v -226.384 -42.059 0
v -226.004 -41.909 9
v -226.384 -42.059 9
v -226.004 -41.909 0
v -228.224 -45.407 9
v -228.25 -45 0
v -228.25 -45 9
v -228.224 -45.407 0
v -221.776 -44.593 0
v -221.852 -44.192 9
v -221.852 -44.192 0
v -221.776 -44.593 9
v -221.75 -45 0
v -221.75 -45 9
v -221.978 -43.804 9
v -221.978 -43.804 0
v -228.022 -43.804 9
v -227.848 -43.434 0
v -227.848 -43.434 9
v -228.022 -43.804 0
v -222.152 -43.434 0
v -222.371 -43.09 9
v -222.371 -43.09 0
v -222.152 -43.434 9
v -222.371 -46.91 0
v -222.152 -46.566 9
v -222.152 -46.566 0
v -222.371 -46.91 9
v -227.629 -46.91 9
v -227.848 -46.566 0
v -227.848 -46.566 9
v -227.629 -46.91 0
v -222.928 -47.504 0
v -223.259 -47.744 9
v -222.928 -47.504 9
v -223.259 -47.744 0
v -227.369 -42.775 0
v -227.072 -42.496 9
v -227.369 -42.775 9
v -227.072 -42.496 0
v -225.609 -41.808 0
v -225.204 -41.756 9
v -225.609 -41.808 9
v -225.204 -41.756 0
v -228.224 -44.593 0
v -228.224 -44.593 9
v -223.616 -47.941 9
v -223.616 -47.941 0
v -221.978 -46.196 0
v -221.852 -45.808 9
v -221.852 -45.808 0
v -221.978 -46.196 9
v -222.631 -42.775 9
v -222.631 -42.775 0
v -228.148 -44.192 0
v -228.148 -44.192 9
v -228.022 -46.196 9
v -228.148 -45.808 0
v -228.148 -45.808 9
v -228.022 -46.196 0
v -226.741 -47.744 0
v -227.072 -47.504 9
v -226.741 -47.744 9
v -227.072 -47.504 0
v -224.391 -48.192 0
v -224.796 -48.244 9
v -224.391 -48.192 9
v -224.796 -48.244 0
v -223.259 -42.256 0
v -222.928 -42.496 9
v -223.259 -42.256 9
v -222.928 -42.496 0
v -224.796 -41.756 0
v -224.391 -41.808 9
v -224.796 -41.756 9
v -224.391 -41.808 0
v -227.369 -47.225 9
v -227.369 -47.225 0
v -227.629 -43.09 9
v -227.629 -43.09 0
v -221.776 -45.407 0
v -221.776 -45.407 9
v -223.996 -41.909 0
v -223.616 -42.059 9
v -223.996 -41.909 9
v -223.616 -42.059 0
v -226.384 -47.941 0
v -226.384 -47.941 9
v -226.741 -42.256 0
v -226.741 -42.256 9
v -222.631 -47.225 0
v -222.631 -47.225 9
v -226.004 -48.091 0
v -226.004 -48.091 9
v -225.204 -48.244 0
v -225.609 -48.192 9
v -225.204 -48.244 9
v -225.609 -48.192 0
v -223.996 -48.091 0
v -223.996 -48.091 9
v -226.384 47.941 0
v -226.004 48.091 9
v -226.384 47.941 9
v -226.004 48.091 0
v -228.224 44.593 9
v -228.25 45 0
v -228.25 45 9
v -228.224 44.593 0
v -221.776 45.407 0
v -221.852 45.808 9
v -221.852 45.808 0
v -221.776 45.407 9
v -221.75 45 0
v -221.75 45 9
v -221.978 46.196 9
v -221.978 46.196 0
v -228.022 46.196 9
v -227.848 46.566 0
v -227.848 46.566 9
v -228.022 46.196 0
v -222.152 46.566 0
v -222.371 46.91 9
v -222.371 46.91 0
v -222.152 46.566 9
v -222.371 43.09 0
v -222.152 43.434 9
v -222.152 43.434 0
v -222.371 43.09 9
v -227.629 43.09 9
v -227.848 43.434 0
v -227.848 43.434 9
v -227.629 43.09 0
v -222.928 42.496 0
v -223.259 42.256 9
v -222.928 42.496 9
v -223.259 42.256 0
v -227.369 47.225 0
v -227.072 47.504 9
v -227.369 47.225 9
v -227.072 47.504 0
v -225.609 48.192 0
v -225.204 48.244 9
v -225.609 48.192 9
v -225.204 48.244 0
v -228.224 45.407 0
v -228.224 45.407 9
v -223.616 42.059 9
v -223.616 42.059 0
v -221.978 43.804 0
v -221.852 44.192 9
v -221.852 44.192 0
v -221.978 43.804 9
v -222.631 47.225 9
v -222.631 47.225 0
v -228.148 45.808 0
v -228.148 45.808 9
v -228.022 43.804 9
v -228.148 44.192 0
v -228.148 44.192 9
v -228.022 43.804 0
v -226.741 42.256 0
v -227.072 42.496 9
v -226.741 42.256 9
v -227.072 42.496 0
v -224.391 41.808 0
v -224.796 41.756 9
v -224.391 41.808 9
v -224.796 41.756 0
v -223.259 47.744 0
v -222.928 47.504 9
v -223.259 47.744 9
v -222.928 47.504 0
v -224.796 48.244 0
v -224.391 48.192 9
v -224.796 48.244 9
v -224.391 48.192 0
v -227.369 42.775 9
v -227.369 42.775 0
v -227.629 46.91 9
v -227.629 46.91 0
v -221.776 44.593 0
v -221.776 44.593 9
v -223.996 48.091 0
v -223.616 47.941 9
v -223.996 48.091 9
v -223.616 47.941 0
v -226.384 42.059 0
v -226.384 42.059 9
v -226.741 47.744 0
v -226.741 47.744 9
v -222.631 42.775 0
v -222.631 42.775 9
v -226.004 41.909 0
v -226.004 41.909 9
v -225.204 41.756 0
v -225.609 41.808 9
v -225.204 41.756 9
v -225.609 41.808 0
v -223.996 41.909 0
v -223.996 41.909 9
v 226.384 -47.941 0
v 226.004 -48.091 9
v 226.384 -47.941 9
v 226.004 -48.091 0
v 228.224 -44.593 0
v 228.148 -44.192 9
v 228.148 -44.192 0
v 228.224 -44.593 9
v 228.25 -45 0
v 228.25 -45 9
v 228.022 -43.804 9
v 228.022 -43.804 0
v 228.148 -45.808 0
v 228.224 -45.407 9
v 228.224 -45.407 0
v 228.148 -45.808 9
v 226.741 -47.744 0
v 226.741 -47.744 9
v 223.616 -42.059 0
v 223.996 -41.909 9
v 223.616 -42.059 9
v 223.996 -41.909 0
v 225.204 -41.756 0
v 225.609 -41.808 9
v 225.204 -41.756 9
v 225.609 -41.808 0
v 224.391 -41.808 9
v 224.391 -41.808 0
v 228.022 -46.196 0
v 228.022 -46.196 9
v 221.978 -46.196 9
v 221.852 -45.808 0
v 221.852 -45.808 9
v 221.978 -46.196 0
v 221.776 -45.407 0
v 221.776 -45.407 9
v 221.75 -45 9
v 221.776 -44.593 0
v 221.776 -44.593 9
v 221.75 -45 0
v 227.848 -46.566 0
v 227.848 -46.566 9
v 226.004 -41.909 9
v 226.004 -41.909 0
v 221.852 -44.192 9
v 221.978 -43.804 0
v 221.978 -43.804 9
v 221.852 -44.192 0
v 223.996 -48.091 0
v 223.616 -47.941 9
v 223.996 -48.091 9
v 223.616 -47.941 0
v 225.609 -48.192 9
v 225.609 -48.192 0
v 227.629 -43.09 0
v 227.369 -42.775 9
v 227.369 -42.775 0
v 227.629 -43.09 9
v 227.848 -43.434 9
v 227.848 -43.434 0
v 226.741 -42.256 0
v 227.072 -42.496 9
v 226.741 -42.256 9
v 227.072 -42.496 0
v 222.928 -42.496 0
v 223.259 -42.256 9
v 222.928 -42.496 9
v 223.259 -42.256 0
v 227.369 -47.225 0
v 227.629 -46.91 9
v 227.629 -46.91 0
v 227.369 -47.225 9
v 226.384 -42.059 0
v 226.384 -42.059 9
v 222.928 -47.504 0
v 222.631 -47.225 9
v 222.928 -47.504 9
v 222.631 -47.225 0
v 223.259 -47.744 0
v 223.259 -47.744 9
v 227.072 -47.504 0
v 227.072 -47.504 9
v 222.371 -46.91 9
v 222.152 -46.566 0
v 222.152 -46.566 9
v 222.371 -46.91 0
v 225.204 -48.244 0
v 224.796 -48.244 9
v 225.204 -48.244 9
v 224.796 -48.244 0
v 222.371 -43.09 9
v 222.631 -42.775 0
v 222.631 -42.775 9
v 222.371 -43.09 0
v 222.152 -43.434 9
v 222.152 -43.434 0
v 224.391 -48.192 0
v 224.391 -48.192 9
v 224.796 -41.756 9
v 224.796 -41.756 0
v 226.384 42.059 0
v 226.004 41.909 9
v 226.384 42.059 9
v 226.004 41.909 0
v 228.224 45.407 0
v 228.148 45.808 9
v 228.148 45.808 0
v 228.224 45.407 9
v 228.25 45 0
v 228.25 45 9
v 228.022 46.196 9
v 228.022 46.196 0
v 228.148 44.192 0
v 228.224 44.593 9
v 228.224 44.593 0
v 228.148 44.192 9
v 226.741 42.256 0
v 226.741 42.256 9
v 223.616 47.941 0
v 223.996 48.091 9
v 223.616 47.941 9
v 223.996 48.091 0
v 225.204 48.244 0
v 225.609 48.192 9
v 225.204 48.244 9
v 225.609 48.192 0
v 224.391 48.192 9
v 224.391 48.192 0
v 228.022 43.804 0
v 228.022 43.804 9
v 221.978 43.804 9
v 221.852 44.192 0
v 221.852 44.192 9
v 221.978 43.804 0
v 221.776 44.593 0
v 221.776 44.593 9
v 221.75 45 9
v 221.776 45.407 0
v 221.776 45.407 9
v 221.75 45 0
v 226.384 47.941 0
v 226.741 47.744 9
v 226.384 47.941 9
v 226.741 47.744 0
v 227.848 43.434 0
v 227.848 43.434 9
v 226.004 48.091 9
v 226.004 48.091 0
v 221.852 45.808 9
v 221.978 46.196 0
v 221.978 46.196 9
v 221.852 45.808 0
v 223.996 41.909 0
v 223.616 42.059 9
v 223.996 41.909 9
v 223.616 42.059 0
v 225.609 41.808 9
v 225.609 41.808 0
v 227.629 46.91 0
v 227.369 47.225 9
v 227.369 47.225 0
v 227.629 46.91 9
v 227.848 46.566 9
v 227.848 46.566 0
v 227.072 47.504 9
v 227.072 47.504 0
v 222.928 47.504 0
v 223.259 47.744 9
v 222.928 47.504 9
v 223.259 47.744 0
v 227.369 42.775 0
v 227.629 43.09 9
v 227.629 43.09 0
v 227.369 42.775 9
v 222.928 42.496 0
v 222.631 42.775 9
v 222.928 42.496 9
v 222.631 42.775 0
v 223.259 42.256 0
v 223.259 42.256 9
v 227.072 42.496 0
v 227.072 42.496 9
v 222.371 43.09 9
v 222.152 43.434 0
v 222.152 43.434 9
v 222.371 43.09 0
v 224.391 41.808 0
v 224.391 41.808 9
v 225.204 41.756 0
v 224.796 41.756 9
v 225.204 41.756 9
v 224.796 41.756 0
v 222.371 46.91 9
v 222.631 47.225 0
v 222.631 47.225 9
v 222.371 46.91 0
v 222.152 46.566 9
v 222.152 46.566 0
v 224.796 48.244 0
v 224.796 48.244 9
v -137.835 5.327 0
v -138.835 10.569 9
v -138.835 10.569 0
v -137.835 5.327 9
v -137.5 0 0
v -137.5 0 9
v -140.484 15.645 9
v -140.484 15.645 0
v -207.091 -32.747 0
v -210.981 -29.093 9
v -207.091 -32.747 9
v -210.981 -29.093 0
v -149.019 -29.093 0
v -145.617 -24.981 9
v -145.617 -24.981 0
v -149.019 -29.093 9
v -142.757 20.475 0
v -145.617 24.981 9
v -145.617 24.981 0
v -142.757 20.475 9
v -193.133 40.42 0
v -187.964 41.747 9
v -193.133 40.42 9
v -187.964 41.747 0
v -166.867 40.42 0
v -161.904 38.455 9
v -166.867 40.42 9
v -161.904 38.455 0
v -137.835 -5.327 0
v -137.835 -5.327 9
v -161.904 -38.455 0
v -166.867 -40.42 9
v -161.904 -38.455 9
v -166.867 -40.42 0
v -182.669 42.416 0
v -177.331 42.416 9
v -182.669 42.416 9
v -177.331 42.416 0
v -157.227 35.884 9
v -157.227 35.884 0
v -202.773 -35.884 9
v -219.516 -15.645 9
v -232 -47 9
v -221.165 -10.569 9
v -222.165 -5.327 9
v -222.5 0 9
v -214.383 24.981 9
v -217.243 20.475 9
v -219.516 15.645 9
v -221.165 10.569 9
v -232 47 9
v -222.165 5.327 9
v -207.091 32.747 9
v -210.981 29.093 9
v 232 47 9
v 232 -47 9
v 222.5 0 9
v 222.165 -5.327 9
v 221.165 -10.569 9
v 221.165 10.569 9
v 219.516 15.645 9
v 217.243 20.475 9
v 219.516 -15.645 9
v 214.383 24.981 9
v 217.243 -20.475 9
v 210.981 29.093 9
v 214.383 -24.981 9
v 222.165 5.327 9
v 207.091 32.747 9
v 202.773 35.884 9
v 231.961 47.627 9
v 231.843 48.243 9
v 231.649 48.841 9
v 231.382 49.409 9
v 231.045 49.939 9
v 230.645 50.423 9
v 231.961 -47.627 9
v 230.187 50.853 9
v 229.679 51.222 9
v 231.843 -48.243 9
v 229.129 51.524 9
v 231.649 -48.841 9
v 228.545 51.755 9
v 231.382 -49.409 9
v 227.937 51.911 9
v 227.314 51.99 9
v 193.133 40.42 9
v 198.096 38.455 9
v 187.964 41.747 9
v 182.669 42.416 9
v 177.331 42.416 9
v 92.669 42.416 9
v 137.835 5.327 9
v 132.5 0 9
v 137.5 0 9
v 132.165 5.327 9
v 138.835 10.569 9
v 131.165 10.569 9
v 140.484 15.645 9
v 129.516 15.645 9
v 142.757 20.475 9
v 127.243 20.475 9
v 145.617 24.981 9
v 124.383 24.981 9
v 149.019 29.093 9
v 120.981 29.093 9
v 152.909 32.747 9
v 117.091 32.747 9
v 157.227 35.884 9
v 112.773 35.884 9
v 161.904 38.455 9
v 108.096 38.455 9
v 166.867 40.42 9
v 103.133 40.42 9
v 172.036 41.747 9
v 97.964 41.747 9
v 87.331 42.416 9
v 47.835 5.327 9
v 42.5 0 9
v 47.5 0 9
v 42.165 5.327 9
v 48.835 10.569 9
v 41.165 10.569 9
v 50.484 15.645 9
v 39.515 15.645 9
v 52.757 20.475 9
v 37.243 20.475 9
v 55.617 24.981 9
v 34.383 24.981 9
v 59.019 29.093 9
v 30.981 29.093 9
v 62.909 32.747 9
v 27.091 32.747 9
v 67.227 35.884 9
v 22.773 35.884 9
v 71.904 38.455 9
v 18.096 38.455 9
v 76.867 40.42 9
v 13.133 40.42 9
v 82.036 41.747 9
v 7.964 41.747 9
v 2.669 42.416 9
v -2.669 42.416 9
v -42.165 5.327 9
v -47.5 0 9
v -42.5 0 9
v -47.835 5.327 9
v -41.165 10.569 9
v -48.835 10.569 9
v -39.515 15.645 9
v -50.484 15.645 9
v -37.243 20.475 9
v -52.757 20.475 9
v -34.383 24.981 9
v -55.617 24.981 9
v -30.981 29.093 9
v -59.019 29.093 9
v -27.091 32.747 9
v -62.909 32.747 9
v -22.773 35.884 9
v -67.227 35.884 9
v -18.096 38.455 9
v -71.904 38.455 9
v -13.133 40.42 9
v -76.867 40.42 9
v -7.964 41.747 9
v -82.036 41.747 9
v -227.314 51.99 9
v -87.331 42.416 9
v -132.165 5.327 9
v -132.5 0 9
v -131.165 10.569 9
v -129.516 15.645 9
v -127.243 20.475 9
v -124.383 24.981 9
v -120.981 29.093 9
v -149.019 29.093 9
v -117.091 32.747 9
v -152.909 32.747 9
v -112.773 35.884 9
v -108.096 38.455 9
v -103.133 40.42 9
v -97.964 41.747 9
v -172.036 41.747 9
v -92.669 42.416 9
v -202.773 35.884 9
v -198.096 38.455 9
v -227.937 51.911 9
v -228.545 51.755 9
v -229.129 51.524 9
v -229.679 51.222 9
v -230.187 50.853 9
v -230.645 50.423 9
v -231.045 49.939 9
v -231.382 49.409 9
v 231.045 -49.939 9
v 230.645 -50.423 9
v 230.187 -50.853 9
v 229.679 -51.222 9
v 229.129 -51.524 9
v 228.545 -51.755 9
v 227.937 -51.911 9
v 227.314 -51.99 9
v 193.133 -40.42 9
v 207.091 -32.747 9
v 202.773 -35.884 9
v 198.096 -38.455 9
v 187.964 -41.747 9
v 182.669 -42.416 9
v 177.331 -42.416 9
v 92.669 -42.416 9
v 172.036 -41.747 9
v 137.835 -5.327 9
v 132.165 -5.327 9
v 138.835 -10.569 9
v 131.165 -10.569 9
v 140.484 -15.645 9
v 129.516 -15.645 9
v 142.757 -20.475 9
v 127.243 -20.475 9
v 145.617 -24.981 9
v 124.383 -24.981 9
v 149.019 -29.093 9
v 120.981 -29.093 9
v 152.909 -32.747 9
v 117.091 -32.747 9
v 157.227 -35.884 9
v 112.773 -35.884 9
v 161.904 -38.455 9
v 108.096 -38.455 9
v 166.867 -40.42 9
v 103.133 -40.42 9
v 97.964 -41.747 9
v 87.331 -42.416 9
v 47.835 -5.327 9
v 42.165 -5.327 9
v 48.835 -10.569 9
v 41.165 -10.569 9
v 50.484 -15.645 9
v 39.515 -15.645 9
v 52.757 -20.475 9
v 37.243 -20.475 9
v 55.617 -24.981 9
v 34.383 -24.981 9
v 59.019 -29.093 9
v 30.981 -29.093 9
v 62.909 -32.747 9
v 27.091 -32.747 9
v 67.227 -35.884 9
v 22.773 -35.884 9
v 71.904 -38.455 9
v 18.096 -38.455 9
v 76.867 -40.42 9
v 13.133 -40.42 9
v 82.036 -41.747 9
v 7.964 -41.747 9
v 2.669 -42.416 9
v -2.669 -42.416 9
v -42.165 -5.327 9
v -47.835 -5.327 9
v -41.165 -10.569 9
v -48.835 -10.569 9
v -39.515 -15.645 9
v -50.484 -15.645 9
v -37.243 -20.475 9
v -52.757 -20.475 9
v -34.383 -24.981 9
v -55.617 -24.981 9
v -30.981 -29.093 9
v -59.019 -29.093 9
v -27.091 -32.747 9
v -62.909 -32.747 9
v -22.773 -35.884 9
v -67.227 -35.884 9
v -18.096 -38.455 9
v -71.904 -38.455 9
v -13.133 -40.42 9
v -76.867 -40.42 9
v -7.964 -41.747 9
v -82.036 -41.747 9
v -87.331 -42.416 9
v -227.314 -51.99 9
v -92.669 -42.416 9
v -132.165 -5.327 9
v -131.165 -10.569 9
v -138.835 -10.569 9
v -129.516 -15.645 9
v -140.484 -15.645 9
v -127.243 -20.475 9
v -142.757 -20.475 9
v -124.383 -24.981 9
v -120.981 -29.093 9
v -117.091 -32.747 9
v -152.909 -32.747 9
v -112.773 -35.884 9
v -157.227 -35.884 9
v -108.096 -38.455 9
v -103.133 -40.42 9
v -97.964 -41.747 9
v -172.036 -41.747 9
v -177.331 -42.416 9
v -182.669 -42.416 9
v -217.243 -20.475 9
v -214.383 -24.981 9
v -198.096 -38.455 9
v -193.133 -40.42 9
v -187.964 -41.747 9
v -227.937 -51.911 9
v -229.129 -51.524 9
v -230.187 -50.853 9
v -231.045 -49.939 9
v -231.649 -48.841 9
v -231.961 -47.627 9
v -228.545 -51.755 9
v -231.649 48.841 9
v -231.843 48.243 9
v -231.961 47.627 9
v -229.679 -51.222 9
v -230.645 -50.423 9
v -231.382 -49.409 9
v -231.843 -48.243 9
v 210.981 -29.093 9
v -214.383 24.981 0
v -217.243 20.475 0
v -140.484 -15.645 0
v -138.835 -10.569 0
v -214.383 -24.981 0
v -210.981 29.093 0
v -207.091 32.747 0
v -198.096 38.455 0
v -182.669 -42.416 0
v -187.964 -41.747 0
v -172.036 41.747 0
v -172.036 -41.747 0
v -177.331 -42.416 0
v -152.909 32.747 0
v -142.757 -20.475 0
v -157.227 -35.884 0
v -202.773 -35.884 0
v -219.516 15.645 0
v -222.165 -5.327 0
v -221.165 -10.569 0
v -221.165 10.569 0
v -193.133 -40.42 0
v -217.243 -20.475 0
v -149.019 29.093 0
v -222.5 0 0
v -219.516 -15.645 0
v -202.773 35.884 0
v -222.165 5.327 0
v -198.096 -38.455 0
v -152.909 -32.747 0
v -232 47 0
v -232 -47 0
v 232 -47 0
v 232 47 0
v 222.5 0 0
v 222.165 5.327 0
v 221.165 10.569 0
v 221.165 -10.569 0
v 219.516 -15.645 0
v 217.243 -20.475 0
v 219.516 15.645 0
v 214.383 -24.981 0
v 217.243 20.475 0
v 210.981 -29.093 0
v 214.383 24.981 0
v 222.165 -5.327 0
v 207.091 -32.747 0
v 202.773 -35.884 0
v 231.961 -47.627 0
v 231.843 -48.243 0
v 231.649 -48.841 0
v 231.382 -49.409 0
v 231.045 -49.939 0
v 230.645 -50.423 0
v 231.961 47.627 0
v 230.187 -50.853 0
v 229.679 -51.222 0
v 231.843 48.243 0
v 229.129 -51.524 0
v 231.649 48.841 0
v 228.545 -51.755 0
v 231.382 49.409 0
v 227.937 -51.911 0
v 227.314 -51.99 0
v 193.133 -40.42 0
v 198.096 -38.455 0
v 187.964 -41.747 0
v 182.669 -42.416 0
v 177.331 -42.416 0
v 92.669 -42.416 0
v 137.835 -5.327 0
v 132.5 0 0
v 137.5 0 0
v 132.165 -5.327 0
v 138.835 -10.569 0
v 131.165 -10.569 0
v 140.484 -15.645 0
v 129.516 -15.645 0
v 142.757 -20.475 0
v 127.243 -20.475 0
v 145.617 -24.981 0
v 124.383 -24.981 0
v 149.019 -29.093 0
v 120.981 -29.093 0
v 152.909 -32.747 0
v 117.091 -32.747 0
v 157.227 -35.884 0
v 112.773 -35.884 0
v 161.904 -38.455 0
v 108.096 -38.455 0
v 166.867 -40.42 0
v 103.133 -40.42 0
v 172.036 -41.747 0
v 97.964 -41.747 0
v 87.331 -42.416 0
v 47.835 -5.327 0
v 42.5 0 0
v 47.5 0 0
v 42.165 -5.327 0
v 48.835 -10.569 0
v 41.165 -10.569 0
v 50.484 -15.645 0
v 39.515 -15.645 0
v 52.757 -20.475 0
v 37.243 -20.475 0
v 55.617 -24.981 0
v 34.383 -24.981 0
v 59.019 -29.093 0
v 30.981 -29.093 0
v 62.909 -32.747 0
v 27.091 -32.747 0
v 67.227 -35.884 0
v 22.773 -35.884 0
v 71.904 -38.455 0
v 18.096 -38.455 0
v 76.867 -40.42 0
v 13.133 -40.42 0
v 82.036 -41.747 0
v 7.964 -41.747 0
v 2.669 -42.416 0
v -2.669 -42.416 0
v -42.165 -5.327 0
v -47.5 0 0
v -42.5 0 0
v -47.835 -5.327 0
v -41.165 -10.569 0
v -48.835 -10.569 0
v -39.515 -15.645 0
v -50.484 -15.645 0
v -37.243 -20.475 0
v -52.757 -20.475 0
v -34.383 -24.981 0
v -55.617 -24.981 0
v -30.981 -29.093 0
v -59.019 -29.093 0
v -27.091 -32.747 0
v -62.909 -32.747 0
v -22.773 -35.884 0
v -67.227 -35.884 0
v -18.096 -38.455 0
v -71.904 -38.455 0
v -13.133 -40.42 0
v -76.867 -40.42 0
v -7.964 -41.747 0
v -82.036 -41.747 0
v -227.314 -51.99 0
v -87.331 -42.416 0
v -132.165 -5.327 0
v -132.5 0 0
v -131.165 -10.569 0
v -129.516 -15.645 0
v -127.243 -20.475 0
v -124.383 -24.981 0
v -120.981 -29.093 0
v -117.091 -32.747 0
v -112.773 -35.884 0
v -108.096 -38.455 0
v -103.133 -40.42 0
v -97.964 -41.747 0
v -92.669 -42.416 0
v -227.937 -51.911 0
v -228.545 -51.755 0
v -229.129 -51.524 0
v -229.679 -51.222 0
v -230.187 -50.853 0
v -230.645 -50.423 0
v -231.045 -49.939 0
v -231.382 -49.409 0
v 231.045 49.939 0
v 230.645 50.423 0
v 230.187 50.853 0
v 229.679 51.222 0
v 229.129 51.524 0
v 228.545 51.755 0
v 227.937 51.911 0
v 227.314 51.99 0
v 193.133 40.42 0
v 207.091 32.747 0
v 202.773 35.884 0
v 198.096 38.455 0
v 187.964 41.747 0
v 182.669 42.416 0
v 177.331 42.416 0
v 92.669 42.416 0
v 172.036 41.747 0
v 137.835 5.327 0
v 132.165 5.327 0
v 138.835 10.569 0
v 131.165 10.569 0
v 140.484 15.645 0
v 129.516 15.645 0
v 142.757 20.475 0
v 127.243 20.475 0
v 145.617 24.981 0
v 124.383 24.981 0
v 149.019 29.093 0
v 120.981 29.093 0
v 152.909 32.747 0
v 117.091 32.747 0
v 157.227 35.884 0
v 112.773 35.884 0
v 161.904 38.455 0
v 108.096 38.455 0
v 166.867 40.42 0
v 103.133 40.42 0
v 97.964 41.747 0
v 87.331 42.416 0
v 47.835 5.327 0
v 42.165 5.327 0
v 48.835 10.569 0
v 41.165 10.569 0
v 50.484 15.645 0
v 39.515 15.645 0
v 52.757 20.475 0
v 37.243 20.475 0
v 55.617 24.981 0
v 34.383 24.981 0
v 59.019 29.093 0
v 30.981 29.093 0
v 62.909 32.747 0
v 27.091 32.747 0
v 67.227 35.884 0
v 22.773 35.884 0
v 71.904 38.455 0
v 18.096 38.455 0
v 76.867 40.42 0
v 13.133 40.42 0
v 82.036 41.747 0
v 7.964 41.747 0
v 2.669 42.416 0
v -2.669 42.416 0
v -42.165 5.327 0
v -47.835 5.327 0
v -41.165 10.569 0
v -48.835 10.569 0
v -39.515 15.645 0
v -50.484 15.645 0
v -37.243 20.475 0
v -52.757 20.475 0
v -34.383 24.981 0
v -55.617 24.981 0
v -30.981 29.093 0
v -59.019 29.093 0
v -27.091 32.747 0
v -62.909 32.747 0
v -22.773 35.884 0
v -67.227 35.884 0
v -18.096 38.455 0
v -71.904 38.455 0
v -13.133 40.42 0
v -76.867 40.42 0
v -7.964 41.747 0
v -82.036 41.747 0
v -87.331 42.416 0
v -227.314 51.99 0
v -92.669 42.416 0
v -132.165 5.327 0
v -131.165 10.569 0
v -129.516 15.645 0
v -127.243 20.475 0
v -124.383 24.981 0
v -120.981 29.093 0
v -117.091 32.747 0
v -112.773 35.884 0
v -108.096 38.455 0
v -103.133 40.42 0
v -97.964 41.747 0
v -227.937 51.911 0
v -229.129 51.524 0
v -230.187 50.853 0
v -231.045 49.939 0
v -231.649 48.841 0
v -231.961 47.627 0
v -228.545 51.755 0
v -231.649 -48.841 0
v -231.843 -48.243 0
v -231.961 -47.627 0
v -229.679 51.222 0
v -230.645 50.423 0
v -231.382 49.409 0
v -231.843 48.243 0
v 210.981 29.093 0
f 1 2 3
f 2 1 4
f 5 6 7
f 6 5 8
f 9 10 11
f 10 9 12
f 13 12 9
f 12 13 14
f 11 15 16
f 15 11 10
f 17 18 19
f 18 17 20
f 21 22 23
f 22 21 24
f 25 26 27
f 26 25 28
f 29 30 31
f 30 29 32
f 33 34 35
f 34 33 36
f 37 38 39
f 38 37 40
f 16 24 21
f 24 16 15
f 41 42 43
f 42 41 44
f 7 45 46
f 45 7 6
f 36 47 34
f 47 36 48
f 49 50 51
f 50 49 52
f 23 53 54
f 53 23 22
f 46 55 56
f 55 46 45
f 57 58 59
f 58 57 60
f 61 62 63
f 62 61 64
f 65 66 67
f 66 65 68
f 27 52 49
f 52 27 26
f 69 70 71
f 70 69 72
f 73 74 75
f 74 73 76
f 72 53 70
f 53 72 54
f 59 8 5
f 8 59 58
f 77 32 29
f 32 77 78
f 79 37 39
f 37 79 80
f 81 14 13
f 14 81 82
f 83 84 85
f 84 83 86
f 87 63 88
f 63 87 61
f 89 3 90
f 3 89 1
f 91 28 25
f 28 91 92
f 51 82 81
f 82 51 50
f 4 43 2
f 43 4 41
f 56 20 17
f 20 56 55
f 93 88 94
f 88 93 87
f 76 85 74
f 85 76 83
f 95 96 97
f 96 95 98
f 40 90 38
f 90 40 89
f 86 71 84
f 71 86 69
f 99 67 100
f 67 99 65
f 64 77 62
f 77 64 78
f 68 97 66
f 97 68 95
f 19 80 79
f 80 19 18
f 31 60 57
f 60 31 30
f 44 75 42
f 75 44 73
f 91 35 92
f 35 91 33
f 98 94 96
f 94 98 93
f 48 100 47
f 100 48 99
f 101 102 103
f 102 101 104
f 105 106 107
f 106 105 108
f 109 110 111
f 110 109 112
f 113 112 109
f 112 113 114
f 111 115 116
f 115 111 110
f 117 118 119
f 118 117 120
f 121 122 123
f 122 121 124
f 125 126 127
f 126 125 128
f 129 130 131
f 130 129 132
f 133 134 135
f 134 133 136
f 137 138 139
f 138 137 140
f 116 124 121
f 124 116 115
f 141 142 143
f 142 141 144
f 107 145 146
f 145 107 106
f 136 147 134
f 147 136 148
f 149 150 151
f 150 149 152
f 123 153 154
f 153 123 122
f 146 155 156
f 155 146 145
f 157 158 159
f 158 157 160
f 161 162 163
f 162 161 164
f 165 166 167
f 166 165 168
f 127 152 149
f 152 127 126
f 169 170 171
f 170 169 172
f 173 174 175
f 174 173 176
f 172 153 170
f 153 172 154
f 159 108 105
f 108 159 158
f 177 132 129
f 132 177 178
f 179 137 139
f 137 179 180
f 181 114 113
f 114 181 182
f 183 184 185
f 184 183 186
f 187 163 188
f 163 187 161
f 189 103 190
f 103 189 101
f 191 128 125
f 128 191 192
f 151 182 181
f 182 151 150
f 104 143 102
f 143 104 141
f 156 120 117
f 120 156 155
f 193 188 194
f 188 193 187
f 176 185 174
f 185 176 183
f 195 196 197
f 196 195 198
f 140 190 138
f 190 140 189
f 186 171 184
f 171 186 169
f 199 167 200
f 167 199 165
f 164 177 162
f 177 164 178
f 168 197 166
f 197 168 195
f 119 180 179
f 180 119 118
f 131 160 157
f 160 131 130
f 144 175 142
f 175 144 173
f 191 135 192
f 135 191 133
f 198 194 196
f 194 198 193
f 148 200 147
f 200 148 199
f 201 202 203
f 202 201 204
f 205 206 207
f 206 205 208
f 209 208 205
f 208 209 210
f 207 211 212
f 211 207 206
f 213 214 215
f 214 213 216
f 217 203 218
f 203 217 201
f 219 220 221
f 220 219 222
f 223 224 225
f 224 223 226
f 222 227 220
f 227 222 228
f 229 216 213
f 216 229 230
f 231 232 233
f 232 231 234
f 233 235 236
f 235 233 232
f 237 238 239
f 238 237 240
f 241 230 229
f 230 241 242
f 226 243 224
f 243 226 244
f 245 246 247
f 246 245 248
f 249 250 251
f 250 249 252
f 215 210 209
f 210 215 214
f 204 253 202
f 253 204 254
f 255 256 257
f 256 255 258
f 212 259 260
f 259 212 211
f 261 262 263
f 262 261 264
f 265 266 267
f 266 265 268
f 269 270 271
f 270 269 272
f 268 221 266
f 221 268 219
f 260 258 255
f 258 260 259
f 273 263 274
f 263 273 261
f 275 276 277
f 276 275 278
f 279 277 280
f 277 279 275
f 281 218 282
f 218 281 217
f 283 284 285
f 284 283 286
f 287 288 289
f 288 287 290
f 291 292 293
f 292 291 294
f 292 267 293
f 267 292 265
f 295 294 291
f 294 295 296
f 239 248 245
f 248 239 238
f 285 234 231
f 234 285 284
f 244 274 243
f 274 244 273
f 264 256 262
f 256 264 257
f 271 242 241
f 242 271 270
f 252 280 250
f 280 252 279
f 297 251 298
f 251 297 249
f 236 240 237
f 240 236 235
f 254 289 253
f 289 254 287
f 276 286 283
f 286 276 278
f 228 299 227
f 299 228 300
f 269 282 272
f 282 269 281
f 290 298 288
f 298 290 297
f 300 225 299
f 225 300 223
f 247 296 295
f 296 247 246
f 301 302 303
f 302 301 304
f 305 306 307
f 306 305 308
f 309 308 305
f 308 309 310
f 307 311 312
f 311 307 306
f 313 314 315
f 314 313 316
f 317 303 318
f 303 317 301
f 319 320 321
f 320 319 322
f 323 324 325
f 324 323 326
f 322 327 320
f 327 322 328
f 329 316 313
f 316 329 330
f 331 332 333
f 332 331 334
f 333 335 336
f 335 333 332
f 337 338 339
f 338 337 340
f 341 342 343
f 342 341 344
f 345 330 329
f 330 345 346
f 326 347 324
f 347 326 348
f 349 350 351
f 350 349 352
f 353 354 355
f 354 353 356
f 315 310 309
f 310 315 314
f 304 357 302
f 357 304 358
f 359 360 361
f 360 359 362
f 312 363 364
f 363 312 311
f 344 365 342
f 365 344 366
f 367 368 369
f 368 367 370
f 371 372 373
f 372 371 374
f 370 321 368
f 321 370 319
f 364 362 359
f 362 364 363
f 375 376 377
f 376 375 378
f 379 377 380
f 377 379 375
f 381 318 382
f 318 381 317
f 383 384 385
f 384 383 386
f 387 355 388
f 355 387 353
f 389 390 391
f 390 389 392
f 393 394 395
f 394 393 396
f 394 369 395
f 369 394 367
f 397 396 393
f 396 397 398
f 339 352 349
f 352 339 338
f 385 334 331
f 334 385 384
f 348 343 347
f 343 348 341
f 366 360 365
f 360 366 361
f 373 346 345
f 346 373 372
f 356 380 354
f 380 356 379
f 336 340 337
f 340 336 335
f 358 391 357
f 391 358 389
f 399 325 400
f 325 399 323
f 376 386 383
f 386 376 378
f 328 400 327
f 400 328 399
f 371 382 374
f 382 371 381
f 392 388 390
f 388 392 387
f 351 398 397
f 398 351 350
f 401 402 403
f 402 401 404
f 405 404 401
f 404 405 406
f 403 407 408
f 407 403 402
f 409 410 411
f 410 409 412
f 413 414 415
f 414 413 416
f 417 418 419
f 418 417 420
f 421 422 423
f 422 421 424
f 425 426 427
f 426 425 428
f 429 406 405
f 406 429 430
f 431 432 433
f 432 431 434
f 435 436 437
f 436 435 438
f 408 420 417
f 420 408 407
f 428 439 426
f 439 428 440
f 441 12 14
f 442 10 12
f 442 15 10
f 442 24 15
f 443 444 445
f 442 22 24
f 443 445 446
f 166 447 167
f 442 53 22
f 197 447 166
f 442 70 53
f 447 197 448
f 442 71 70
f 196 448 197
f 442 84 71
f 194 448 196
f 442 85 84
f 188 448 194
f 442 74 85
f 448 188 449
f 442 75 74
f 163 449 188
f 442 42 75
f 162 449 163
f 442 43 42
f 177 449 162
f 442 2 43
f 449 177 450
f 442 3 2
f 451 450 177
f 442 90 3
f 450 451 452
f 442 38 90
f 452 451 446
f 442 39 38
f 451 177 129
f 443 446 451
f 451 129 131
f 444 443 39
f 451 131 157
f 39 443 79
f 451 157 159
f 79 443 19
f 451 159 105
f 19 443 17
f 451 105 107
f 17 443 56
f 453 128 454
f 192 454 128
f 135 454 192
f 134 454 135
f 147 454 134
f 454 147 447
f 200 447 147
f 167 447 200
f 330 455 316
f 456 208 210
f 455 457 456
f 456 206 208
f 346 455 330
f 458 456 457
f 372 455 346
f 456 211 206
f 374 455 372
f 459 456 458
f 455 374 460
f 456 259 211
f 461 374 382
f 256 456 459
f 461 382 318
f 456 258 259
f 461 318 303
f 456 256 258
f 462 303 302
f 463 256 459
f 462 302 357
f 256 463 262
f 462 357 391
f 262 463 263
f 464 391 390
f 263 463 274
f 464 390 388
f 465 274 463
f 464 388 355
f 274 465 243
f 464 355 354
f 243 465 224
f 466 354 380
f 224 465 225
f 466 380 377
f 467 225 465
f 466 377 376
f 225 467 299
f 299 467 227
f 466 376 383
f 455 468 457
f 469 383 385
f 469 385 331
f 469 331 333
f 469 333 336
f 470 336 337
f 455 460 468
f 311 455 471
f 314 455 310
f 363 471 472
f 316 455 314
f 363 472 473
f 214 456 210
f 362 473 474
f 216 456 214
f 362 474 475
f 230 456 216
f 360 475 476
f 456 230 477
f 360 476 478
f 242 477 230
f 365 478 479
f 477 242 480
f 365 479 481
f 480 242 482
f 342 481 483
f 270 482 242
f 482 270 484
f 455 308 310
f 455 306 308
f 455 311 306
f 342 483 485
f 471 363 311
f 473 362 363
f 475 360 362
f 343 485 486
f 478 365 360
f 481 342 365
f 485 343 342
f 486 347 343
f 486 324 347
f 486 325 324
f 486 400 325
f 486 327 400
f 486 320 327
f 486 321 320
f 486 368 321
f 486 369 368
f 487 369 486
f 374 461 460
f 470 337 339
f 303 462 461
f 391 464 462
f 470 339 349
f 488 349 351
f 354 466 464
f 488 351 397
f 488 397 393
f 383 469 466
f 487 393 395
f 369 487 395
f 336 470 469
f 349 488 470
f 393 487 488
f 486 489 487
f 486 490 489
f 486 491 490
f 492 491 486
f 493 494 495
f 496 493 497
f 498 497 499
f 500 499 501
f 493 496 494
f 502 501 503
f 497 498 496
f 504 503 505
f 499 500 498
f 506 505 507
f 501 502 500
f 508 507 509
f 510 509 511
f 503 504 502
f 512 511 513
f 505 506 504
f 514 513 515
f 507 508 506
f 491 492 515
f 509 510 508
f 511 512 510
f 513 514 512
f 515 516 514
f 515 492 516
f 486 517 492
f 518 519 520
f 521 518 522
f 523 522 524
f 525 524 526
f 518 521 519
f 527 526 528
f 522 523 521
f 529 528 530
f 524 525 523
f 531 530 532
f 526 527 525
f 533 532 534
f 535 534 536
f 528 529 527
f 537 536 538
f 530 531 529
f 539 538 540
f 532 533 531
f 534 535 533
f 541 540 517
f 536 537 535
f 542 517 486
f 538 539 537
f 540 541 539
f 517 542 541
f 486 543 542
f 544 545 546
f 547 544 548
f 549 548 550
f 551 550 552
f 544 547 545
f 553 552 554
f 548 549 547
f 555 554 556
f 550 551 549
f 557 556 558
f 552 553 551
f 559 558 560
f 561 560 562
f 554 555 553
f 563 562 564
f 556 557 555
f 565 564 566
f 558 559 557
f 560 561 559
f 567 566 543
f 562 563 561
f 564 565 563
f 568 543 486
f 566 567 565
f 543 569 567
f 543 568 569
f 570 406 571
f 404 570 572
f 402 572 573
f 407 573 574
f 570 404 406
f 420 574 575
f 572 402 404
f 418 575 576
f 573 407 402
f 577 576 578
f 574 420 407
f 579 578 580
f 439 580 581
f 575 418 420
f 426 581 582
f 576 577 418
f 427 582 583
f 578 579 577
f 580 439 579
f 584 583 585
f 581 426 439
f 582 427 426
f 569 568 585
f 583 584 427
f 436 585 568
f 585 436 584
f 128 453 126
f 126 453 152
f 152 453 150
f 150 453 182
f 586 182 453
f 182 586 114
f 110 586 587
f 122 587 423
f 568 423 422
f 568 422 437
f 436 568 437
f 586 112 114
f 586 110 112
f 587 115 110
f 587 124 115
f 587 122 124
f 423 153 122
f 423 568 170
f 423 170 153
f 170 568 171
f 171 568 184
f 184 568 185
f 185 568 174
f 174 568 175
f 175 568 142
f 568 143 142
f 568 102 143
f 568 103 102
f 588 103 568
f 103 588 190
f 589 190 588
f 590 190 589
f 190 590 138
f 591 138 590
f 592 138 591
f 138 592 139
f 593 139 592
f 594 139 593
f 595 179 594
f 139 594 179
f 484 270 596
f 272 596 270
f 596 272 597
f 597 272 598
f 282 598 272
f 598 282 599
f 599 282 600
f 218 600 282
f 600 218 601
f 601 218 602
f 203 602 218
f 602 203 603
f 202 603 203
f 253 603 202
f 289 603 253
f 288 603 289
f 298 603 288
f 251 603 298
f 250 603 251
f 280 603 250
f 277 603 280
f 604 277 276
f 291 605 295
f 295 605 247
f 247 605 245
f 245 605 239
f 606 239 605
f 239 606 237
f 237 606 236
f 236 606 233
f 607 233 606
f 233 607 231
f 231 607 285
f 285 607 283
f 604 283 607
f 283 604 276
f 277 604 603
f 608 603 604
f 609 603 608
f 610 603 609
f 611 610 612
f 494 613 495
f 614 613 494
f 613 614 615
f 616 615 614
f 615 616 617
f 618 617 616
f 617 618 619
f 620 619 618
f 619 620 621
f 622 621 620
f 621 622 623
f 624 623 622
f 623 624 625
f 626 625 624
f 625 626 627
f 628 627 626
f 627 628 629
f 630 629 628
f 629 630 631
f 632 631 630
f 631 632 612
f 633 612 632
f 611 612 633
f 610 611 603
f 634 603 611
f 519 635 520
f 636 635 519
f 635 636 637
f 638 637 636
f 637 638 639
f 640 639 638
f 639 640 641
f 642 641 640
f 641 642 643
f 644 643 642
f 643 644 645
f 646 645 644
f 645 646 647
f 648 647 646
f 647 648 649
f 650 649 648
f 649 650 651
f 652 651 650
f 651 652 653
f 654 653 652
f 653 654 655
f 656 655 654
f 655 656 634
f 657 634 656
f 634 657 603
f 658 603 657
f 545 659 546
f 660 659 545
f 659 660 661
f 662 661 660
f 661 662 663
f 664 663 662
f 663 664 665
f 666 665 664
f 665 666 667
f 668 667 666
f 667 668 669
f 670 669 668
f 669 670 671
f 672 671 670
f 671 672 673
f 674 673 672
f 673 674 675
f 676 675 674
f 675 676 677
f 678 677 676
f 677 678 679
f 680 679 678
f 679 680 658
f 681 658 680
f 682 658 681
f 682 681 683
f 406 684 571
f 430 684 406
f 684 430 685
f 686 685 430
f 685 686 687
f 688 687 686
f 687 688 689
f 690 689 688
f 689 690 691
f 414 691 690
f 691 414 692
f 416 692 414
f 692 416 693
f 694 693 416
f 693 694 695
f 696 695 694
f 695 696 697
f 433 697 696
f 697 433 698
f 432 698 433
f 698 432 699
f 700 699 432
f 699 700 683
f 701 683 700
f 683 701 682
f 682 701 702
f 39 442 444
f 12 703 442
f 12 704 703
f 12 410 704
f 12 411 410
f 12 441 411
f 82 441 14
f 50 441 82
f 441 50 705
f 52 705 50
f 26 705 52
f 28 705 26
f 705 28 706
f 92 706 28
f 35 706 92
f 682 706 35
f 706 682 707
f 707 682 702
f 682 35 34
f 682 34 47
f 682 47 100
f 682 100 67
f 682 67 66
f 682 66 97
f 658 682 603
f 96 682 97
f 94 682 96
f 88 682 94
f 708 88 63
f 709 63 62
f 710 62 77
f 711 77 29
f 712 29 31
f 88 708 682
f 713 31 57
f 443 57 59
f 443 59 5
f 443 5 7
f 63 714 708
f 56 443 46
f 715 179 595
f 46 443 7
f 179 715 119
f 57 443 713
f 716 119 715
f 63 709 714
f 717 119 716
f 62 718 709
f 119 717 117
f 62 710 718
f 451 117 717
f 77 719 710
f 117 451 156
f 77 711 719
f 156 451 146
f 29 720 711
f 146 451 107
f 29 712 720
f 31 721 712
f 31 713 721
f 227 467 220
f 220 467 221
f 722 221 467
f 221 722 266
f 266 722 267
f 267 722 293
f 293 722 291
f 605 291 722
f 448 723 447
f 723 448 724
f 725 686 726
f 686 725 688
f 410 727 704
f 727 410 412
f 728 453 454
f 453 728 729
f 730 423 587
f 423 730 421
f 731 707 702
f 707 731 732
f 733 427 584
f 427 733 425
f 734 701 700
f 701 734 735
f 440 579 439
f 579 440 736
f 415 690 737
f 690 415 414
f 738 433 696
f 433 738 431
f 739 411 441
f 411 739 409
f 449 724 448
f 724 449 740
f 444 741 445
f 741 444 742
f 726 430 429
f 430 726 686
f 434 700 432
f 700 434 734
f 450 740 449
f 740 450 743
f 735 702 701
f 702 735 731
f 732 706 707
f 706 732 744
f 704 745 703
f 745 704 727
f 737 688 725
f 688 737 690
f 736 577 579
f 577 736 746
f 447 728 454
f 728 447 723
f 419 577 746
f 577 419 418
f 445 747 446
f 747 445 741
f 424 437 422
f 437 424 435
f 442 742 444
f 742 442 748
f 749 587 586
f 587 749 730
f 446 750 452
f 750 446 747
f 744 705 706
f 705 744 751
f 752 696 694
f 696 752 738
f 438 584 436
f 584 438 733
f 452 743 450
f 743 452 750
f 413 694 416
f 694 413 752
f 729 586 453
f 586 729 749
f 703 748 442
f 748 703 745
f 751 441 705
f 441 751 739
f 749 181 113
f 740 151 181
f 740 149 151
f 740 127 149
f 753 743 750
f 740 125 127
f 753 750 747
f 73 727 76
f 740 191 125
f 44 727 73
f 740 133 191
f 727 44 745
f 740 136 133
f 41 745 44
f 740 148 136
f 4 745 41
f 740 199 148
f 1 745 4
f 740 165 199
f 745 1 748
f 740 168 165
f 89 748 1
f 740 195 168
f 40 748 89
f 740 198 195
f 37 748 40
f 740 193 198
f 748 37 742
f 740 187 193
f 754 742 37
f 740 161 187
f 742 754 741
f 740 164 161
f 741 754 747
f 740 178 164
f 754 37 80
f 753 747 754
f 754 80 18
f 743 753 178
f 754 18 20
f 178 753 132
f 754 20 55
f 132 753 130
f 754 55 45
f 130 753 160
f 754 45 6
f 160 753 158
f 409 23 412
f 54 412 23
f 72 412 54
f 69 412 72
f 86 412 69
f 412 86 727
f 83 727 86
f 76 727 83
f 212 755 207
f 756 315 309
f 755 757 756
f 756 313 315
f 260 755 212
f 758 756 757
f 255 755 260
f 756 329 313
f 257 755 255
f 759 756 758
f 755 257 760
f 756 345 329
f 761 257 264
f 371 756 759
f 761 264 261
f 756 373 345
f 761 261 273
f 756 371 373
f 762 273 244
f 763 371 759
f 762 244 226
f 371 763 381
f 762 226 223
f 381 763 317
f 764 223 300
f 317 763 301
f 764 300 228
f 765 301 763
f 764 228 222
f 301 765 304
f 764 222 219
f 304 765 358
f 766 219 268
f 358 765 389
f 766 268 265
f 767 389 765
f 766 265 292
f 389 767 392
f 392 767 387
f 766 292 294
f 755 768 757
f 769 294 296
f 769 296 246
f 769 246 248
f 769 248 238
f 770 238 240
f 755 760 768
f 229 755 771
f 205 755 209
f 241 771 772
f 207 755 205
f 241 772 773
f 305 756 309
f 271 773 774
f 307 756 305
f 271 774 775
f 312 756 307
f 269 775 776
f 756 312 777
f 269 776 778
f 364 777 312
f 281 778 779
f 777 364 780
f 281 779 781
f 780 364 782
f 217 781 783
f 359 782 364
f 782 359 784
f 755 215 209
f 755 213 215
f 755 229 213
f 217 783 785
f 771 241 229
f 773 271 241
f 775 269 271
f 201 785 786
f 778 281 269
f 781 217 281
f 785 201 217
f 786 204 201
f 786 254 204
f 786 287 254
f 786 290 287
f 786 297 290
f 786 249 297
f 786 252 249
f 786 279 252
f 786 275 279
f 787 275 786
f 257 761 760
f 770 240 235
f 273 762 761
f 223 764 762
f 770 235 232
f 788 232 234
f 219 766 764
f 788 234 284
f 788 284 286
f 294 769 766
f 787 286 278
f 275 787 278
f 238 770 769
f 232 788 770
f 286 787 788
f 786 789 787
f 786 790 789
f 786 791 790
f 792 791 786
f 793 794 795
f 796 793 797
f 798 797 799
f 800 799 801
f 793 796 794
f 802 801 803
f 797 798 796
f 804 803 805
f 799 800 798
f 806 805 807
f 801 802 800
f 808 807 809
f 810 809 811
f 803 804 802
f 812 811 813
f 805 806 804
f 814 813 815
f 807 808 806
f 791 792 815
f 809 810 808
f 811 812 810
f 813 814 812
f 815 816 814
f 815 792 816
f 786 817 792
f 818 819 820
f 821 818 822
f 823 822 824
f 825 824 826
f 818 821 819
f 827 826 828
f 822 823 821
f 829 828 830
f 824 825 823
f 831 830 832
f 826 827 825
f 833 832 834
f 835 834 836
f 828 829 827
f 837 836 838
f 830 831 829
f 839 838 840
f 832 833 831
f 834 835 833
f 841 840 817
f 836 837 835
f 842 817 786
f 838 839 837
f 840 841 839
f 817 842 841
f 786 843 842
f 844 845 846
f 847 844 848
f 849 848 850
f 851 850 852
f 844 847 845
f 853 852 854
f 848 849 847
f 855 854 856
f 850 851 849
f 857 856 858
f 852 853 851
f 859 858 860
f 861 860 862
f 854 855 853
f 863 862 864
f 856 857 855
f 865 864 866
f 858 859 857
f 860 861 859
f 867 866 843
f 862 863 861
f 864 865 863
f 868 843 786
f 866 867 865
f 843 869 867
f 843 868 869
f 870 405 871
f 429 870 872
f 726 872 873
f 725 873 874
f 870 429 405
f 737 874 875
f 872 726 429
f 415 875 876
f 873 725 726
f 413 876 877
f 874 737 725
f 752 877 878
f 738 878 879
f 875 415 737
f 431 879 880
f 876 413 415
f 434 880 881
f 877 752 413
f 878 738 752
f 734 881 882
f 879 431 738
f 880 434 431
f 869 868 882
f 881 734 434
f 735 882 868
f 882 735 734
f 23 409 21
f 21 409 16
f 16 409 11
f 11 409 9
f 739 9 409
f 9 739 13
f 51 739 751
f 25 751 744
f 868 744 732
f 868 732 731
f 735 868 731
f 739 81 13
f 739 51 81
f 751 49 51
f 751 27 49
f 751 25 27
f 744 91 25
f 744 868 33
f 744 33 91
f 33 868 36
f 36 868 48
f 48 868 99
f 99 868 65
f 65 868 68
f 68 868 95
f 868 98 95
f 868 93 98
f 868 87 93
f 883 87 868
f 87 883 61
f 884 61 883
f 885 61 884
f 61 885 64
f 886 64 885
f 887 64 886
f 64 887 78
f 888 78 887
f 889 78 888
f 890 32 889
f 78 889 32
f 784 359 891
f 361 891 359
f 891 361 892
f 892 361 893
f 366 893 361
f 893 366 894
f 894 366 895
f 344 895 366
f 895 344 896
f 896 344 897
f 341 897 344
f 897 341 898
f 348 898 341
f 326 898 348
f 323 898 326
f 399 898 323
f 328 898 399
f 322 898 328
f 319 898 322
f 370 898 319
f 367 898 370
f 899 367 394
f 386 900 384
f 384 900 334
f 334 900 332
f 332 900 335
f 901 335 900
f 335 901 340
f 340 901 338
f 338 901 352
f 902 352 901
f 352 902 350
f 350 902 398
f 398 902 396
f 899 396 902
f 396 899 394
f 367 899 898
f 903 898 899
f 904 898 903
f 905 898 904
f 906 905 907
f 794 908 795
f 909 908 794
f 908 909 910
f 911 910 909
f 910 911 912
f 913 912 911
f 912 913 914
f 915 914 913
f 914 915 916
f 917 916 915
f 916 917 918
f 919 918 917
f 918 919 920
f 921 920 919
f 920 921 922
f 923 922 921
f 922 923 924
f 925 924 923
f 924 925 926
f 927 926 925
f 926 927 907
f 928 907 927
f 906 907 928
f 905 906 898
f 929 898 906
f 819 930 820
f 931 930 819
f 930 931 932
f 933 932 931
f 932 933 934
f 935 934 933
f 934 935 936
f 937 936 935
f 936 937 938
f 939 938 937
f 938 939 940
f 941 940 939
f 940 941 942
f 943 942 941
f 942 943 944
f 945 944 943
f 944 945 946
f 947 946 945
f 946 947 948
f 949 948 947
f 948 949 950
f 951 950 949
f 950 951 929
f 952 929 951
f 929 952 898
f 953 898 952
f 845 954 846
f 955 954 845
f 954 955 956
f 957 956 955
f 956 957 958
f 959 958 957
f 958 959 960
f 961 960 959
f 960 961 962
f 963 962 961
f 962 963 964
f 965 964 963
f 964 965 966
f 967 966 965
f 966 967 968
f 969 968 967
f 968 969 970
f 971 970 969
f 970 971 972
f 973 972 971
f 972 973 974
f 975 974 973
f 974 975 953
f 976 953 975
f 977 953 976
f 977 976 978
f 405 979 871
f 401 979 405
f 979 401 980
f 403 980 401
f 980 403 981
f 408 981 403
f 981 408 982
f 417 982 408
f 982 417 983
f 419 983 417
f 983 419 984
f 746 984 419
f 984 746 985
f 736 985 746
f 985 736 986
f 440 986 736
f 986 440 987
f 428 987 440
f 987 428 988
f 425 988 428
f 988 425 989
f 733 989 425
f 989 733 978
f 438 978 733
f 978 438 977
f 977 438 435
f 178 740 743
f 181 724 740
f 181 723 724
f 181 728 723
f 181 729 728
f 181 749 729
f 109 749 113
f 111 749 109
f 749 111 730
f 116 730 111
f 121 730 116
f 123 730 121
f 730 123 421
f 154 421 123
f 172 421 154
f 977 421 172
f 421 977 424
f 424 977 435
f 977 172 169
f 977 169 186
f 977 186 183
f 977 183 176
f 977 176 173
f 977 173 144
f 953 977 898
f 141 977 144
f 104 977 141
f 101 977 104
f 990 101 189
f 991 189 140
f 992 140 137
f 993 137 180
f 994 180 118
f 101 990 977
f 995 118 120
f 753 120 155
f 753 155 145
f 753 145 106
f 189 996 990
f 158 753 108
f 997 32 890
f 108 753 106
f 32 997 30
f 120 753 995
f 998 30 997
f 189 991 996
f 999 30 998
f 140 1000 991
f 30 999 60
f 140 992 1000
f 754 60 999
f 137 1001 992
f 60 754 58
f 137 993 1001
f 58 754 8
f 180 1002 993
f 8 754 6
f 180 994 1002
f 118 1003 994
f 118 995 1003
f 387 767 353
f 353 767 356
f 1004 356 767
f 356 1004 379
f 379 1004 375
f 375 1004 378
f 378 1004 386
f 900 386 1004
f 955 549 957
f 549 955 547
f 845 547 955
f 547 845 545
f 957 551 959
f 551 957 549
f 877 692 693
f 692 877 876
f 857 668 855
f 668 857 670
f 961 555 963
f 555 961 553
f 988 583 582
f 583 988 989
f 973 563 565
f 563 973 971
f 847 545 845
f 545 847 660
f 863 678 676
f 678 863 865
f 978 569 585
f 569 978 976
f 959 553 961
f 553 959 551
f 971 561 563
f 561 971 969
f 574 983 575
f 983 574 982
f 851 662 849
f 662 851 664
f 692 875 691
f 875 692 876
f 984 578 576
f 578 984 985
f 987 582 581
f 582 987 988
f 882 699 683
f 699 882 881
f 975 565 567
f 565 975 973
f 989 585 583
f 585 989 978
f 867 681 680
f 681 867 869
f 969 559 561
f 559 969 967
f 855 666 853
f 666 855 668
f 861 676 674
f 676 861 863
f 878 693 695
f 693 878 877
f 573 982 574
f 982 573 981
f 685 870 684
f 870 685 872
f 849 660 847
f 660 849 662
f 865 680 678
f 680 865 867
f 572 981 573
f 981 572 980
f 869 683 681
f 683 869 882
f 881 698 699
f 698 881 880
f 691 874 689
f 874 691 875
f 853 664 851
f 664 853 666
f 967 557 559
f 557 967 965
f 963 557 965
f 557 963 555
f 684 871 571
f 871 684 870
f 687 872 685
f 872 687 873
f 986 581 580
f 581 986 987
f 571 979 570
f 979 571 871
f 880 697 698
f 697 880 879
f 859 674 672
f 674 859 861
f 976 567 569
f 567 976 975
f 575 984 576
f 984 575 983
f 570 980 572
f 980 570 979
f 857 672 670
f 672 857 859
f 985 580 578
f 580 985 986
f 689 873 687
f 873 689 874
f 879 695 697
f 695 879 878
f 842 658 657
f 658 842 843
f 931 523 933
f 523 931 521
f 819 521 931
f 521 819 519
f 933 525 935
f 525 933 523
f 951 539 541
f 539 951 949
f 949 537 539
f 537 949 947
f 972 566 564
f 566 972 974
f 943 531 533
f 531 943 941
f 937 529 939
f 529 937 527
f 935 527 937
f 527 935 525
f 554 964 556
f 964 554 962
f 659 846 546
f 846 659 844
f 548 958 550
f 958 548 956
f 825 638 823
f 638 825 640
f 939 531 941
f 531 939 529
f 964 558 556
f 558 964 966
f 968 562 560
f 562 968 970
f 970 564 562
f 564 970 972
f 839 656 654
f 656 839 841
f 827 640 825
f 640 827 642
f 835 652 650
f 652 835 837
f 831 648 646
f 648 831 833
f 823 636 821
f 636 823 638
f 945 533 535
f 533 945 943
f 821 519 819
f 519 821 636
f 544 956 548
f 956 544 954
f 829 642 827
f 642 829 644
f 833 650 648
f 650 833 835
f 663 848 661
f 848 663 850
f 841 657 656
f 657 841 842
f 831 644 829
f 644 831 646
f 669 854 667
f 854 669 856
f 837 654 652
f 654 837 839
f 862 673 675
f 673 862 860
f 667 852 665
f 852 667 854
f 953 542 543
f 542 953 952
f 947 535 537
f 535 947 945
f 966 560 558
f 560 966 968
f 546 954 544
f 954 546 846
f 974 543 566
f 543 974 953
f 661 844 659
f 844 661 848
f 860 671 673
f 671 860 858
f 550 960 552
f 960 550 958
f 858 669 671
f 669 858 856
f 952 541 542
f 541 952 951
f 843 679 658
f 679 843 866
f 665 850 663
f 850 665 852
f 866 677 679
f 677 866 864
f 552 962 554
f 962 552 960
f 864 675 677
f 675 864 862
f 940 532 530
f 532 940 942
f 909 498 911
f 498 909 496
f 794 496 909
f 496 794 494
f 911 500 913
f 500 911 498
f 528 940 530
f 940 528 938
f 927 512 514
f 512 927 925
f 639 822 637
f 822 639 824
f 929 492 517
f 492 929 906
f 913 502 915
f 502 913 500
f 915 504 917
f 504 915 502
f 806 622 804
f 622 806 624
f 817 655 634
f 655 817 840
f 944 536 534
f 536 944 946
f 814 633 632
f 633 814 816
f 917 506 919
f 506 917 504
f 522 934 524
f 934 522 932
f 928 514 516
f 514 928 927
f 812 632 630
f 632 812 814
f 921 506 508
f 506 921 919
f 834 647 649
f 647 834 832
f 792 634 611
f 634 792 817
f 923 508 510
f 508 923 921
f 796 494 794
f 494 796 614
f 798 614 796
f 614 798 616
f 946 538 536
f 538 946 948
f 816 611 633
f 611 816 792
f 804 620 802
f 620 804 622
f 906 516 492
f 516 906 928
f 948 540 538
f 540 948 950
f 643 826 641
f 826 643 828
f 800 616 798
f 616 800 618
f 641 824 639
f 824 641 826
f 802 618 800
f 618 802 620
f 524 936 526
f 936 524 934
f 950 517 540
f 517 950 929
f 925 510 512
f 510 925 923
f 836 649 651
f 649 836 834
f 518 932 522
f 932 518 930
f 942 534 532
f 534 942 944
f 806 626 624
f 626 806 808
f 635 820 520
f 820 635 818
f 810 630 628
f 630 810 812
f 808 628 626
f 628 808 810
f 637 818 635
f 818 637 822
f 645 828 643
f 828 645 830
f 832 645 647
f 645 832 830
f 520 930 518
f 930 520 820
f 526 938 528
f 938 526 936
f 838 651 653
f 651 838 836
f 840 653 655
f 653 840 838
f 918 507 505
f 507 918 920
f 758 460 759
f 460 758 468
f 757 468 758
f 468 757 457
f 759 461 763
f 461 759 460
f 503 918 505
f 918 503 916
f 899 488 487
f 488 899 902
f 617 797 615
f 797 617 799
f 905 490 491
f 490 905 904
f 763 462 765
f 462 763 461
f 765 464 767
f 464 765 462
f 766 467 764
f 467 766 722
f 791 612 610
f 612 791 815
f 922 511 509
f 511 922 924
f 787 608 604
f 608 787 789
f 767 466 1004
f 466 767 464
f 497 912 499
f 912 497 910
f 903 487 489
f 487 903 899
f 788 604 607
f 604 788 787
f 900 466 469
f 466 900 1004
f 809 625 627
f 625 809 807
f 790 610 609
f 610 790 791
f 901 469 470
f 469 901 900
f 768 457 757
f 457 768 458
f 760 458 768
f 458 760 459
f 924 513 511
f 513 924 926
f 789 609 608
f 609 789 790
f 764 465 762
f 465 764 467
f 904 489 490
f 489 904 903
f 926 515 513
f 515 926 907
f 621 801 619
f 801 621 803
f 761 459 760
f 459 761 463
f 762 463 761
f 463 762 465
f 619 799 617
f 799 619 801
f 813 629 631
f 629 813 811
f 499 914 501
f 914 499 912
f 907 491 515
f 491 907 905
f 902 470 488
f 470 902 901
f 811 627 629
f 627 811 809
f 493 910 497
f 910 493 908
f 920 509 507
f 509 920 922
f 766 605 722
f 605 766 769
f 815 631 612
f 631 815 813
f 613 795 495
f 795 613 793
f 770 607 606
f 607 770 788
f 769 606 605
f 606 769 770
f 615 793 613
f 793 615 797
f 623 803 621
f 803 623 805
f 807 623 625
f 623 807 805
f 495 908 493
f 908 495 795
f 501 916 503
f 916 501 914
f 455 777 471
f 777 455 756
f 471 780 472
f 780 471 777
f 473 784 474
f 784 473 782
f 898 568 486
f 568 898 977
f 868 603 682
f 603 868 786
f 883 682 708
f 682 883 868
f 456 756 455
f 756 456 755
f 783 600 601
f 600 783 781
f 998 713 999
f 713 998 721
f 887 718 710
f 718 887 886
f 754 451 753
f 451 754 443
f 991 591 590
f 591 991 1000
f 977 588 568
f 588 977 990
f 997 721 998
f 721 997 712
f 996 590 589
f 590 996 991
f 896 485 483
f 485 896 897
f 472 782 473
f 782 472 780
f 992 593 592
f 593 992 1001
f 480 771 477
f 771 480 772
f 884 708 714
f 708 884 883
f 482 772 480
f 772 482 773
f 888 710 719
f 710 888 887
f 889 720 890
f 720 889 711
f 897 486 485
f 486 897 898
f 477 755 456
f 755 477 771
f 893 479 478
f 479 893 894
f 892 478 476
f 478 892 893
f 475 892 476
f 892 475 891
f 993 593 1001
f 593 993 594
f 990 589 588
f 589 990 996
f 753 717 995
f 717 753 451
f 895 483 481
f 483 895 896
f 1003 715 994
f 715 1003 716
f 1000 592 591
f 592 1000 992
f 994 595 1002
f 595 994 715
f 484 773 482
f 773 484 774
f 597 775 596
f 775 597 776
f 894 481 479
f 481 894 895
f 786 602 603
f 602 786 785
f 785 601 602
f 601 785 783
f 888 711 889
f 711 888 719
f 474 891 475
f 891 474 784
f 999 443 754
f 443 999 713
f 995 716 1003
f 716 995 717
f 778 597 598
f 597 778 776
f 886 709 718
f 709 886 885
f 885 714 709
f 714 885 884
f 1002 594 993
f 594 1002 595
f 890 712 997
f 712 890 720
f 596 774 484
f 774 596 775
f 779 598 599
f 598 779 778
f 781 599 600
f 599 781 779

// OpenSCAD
$fn = 50;


difference() {
	union() {
		hull() {
			translate(v = [-227.0000000000, 47.0000000000, 0]) {
				cylinder(h = 9, r = 5);
			}
			translate(v = [227.0000000000, 47.0000000000, 0]) {
				cylinder(h = 9, r = 5);
			}
			translate(v = [-227.0000000000, -47.0000000000, 0]) {
				cylinder(h = 9, r = 5);
			}
			translate(v = [227.0000000000, -47.0000000000, 0]) {
				cylinder(h = 9, r = 5);
			}
		}
	}
	union() {
		#translate(v = [-225.0000000000, -45.0000000000, -100.0000000000]) {
			cylinder(h = 200, r = 3.2500000000);
		}
		#translate(v = [-225.0000000000, 45.0000000000, -100.0000000000]) {
			cylinder(h = 200, r = 3.2500000000);
		}
		#translate(v = [225.0000000000, -45.0000000000, -100.0000000000]) {
			cylinder(h = 200, r = 3.2500000000);
		}
		#translate(v = [225.0000000000, 45.0000000000, -100.0000000000]) {
			cylinder(h = 200, r = 3.2500000000);
		}
		#translate(v = [-180.0000000000, 0, 0]) {
			cylinder(h = 9, r = 42.5000000000);
		}
		#translate(v = [-90.0000000000, 0, 0]) {
			cylinder(h = 9, r = 42.5000000000);
		}
		#cylinder(h = 9, r = 42.5000000000);
		#translate(v = [90.0000000000, 0, 0]) {
			cylinder(h = 9, r = 42.5000000000);
		}
		#translate(v = [180.0000000000, 0, 0]) {
			cylinder(h = 9, r = 42.5000000000);
		}
	}
}
